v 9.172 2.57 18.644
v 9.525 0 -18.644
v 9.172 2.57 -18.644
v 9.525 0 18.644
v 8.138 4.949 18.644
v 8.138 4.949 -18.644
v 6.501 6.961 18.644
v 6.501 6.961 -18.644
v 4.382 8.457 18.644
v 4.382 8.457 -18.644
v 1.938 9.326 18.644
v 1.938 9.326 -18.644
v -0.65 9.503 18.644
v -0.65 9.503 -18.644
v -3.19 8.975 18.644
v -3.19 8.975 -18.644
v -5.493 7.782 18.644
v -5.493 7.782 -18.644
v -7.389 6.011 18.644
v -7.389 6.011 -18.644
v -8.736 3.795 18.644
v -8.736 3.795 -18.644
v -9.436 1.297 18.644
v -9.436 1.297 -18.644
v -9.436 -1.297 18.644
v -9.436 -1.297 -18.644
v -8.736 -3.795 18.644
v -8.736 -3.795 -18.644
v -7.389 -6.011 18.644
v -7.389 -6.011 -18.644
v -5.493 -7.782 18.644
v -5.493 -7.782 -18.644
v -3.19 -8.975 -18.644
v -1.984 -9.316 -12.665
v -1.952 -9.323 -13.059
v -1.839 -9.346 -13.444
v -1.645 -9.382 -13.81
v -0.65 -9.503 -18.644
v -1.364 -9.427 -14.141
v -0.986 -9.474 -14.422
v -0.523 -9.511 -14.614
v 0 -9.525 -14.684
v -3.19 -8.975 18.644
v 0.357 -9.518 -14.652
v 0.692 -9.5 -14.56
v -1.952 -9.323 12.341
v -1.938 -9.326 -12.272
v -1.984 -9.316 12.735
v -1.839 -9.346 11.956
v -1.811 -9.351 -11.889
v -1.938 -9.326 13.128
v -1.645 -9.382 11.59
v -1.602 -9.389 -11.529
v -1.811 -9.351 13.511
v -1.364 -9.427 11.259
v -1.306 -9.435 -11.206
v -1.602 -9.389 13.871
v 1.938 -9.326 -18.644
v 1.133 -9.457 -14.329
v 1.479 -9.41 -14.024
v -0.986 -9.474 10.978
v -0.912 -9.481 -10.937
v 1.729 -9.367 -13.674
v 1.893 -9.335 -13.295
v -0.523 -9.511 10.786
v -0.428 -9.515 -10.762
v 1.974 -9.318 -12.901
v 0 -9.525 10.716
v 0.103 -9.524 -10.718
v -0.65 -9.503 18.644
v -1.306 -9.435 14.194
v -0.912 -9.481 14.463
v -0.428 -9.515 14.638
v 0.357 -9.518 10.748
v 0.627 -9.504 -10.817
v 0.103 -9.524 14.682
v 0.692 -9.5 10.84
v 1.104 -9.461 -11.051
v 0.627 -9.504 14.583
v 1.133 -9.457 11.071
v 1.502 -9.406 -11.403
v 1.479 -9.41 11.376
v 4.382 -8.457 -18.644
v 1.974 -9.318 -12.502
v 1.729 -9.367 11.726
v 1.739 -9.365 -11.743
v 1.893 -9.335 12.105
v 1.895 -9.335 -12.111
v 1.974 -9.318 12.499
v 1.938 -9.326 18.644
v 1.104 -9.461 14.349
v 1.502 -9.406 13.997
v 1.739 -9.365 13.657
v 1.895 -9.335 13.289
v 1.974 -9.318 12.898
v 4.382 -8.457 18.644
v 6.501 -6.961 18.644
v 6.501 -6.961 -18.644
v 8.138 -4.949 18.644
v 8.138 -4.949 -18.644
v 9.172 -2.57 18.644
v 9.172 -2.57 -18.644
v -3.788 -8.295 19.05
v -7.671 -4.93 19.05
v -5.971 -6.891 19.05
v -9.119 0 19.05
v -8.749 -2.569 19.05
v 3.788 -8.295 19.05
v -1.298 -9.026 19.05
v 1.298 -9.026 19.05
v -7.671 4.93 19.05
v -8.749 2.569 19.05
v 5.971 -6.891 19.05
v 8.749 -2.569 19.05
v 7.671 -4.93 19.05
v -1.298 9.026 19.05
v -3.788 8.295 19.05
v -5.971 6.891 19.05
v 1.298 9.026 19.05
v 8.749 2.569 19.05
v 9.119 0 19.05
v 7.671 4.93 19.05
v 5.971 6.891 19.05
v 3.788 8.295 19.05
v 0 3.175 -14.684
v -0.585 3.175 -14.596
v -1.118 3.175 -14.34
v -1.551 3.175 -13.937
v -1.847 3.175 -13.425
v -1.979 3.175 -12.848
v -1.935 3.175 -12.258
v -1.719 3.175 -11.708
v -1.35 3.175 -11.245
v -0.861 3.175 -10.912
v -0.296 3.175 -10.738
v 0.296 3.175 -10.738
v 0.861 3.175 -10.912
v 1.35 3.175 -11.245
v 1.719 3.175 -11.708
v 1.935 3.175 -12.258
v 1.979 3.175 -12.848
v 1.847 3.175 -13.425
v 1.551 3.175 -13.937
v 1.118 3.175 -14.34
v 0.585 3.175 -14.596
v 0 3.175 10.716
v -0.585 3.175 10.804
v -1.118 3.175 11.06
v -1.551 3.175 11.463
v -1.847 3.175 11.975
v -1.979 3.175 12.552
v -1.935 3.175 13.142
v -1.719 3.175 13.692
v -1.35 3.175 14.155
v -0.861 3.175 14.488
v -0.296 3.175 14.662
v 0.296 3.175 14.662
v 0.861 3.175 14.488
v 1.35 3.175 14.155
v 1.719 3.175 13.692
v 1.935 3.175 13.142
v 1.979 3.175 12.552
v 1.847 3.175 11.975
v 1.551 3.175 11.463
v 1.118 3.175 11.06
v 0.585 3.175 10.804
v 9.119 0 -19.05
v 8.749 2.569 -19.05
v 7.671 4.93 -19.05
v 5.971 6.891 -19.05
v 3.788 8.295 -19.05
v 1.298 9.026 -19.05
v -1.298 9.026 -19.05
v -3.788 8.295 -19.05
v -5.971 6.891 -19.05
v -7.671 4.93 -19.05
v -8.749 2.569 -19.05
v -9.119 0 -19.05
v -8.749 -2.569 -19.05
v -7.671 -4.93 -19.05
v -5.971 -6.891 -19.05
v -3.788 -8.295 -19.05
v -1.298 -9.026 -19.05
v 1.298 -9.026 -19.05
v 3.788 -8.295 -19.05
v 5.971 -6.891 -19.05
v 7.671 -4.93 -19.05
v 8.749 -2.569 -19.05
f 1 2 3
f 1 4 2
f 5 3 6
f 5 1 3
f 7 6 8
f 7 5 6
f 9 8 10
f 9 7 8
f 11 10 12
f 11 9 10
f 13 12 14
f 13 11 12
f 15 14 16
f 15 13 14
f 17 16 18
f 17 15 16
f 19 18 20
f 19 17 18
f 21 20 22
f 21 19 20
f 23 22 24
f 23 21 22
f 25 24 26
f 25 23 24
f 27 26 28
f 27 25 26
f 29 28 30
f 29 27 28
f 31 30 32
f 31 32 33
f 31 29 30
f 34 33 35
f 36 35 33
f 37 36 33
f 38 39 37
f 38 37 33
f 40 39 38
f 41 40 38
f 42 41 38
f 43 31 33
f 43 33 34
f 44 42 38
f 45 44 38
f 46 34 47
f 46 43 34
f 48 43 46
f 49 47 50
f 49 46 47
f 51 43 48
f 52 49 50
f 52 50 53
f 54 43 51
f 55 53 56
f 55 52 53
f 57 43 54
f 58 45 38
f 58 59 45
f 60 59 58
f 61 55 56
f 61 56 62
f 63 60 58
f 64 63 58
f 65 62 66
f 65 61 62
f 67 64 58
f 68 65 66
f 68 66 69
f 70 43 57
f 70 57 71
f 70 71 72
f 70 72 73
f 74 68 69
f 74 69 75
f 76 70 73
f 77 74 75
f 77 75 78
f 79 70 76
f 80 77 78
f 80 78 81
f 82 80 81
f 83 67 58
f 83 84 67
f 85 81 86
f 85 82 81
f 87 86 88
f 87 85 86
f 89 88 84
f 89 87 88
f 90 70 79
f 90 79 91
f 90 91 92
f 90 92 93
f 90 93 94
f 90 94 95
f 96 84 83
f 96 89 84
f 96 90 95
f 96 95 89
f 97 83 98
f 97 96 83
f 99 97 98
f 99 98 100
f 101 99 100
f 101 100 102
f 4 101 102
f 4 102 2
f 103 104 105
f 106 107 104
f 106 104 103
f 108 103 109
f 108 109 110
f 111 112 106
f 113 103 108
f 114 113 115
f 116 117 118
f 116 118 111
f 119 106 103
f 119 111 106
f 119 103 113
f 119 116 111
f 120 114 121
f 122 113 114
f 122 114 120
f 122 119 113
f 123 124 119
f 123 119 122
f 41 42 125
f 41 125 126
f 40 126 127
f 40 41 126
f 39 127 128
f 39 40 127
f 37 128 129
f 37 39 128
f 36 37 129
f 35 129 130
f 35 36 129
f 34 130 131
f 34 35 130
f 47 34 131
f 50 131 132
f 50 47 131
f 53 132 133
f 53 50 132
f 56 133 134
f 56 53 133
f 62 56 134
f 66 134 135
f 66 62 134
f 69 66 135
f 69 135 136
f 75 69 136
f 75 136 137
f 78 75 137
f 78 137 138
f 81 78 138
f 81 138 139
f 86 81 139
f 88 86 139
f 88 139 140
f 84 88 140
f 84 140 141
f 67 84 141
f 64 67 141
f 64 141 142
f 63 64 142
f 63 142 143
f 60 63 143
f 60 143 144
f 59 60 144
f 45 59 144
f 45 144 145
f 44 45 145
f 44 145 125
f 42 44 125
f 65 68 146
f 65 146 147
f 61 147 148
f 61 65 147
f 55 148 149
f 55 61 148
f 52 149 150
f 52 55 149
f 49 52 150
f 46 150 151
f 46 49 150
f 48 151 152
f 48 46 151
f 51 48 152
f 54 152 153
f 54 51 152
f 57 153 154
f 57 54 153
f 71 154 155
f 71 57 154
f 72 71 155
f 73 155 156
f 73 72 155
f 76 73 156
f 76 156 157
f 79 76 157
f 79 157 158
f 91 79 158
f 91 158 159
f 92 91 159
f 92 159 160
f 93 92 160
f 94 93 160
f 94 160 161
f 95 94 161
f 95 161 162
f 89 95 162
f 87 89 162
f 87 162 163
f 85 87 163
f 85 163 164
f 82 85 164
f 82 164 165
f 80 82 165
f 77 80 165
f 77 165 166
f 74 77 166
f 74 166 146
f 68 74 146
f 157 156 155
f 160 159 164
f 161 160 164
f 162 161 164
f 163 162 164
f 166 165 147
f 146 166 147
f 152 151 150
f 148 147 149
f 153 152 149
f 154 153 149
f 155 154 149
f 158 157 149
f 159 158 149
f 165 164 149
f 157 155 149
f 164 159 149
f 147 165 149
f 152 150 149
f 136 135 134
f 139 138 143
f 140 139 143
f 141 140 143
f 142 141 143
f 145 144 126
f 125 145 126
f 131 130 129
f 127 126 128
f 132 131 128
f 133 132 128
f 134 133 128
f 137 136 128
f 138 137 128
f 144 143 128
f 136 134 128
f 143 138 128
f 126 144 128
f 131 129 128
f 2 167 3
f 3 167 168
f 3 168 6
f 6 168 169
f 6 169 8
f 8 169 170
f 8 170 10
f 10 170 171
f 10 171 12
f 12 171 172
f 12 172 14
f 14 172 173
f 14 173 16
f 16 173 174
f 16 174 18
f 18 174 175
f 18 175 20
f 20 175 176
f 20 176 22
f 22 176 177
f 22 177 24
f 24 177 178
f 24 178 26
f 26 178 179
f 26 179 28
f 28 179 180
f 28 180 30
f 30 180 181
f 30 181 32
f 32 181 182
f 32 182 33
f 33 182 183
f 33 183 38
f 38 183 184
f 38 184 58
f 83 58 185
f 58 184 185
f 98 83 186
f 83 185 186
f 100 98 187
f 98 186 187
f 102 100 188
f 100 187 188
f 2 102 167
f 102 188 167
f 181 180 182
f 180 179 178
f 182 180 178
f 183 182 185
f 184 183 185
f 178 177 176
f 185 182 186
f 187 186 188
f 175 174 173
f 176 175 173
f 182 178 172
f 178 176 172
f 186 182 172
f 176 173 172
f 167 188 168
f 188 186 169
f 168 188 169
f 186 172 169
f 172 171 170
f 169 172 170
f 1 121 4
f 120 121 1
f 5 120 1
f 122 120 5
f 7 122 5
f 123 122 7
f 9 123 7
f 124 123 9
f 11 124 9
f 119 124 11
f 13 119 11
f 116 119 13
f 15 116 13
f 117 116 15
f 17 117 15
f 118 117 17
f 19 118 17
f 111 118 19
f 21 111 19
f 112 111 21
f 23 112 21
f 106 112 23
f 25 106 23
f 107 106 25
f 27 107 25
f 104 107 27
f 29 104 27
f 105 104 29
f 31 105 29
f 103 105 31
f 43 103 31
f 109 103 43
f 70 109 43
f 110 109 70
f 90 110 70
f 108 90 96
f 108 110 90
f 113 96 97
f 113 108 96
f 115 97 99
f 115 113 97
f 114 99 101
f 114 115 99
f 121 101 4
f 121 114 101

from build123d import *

# Parameters (mm, degrees)
SKETCH1_R         = 9.525
EXTRUDE1_DEPTH    = 19.05
CHAMFER1_SIZE     = 0.4064
SKETCH6_R         = 1.984375
BLIND_HOLES_DEPTH = 12.7


with BuildPart() as part:
    # Sketch1 → Extrude1 (new body, symmetric)
    with BuildSketch(Plane.XY):
        Circle(SKETCH1_R)
    extrude(amount=EXTRUDE1_DEPTH, both=True)

    # Chamfer1
    chamfer1_edges = [part.edges().sort_by_distance(p)[0] for p in [
        (-9.525, 0, -19.05),
        (-9.525, 0, 19.05),
    ]]
    chamfer(chamfer1_edges, length=CHAMFER1_SIZE)

    # Sketch6 → Blind Holes (cut)
    with BuildSketch(Plane(origin=(0, -9.525, 0), x_dir=(-1, 0, 0), z_dir=(0, 1, 0))):
        with Locations(Location((0, 12.7, 0), (0, 0, 270))):  # turned: the seam where the file's is
            Circle(SKETCH6_R)
        with Locations(Location((0, -12.7, 0), (0, 0, 270))):  # turned: the seam where the file's is
            Circle(SKETCH6_R)
    extrude(amount=BLIND_HOLES_DEPTH, mode=Mode.SUBTRACT)


solid = part.part
